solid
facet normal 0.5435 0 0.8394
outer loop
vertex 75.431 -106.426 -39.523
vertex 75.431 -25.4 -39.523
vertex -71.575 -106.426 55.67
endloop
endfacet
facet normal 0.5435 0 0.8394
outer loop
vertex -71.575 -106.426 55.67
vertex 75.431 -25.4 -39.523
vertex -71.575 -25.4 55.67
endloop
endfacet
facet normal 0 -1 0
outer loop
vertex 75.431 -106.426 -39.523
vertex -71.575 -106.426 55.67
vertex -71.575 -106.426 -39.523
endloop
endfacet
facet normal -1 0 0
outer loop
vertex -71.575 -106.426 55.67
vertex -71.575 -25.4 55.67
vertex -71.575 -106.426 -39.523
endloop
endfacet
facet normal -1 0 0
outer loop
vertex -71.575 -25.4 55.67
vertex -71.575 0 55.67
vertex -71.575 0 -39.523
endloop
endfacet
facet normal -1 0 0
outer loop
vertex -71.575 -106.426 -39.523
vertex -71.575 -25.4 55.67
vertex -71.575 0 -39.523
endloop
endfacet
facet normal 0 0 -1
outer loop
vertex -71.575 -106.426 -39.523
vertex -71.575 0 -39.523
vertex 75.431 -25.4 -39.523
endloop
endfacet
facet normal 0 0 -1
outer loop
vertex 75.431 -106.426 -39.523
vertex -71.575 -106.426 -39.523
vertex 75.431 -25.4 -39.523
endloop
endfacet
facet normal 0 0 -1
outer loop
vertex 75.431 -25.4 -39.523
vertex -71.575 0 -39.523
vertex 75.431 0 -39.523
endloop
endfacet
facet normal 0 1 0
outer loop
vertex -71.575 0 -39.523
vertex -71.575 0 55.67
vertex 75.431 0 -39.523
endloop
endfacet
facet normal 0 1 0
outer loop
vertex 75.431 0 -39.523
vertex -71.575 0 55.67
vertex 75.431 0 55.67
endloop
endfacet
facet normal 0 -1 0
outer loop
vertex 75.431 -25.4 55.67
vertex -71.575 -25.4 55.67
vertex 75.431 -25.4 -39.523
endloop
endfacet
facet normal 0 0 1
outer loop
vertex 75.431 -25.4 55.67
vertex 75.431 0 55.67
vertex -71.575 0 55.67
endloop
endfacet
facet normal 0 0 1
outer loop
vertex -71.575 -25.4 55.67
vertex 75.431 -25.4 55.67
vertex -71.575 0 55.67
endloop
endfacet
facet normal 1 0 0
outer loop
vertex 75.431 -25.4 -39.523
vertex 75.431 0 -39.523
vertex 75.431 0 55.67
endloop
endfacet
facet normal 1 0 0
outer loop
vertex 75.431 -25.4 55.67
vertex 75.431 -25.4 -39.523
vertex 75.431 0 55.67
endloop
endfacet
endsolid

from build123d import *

# Parameters (mm, degrees)
F1_DEPTH = 106.426
F2_DEPTH = 25.4


with BuildPart() as f1:
    # F0 (on Front) → F1 (new body)
    with BuildSketch(Plane.XZ):
        Polygon((75.431123, -39.523013), (-71.575209, 55.669609), (-71.575209, -39.523013), align=None)
    extrude(amount=F1_DEPTH)

    # F0 (on Front) → F2 (join)
    with BuildSketch(Plane.XZ):
        Polygon((75.431123, -39.523013), (-71.575209, 55.669609), (-71.575209, -39.523013), align=None)
        Polygon((75.431123, 55.669609), (-71.575209, 55.669609), (75.431123, -39.523013), align=None)
    extrude(amount=F2_DEPTH)


solid = f1.part
